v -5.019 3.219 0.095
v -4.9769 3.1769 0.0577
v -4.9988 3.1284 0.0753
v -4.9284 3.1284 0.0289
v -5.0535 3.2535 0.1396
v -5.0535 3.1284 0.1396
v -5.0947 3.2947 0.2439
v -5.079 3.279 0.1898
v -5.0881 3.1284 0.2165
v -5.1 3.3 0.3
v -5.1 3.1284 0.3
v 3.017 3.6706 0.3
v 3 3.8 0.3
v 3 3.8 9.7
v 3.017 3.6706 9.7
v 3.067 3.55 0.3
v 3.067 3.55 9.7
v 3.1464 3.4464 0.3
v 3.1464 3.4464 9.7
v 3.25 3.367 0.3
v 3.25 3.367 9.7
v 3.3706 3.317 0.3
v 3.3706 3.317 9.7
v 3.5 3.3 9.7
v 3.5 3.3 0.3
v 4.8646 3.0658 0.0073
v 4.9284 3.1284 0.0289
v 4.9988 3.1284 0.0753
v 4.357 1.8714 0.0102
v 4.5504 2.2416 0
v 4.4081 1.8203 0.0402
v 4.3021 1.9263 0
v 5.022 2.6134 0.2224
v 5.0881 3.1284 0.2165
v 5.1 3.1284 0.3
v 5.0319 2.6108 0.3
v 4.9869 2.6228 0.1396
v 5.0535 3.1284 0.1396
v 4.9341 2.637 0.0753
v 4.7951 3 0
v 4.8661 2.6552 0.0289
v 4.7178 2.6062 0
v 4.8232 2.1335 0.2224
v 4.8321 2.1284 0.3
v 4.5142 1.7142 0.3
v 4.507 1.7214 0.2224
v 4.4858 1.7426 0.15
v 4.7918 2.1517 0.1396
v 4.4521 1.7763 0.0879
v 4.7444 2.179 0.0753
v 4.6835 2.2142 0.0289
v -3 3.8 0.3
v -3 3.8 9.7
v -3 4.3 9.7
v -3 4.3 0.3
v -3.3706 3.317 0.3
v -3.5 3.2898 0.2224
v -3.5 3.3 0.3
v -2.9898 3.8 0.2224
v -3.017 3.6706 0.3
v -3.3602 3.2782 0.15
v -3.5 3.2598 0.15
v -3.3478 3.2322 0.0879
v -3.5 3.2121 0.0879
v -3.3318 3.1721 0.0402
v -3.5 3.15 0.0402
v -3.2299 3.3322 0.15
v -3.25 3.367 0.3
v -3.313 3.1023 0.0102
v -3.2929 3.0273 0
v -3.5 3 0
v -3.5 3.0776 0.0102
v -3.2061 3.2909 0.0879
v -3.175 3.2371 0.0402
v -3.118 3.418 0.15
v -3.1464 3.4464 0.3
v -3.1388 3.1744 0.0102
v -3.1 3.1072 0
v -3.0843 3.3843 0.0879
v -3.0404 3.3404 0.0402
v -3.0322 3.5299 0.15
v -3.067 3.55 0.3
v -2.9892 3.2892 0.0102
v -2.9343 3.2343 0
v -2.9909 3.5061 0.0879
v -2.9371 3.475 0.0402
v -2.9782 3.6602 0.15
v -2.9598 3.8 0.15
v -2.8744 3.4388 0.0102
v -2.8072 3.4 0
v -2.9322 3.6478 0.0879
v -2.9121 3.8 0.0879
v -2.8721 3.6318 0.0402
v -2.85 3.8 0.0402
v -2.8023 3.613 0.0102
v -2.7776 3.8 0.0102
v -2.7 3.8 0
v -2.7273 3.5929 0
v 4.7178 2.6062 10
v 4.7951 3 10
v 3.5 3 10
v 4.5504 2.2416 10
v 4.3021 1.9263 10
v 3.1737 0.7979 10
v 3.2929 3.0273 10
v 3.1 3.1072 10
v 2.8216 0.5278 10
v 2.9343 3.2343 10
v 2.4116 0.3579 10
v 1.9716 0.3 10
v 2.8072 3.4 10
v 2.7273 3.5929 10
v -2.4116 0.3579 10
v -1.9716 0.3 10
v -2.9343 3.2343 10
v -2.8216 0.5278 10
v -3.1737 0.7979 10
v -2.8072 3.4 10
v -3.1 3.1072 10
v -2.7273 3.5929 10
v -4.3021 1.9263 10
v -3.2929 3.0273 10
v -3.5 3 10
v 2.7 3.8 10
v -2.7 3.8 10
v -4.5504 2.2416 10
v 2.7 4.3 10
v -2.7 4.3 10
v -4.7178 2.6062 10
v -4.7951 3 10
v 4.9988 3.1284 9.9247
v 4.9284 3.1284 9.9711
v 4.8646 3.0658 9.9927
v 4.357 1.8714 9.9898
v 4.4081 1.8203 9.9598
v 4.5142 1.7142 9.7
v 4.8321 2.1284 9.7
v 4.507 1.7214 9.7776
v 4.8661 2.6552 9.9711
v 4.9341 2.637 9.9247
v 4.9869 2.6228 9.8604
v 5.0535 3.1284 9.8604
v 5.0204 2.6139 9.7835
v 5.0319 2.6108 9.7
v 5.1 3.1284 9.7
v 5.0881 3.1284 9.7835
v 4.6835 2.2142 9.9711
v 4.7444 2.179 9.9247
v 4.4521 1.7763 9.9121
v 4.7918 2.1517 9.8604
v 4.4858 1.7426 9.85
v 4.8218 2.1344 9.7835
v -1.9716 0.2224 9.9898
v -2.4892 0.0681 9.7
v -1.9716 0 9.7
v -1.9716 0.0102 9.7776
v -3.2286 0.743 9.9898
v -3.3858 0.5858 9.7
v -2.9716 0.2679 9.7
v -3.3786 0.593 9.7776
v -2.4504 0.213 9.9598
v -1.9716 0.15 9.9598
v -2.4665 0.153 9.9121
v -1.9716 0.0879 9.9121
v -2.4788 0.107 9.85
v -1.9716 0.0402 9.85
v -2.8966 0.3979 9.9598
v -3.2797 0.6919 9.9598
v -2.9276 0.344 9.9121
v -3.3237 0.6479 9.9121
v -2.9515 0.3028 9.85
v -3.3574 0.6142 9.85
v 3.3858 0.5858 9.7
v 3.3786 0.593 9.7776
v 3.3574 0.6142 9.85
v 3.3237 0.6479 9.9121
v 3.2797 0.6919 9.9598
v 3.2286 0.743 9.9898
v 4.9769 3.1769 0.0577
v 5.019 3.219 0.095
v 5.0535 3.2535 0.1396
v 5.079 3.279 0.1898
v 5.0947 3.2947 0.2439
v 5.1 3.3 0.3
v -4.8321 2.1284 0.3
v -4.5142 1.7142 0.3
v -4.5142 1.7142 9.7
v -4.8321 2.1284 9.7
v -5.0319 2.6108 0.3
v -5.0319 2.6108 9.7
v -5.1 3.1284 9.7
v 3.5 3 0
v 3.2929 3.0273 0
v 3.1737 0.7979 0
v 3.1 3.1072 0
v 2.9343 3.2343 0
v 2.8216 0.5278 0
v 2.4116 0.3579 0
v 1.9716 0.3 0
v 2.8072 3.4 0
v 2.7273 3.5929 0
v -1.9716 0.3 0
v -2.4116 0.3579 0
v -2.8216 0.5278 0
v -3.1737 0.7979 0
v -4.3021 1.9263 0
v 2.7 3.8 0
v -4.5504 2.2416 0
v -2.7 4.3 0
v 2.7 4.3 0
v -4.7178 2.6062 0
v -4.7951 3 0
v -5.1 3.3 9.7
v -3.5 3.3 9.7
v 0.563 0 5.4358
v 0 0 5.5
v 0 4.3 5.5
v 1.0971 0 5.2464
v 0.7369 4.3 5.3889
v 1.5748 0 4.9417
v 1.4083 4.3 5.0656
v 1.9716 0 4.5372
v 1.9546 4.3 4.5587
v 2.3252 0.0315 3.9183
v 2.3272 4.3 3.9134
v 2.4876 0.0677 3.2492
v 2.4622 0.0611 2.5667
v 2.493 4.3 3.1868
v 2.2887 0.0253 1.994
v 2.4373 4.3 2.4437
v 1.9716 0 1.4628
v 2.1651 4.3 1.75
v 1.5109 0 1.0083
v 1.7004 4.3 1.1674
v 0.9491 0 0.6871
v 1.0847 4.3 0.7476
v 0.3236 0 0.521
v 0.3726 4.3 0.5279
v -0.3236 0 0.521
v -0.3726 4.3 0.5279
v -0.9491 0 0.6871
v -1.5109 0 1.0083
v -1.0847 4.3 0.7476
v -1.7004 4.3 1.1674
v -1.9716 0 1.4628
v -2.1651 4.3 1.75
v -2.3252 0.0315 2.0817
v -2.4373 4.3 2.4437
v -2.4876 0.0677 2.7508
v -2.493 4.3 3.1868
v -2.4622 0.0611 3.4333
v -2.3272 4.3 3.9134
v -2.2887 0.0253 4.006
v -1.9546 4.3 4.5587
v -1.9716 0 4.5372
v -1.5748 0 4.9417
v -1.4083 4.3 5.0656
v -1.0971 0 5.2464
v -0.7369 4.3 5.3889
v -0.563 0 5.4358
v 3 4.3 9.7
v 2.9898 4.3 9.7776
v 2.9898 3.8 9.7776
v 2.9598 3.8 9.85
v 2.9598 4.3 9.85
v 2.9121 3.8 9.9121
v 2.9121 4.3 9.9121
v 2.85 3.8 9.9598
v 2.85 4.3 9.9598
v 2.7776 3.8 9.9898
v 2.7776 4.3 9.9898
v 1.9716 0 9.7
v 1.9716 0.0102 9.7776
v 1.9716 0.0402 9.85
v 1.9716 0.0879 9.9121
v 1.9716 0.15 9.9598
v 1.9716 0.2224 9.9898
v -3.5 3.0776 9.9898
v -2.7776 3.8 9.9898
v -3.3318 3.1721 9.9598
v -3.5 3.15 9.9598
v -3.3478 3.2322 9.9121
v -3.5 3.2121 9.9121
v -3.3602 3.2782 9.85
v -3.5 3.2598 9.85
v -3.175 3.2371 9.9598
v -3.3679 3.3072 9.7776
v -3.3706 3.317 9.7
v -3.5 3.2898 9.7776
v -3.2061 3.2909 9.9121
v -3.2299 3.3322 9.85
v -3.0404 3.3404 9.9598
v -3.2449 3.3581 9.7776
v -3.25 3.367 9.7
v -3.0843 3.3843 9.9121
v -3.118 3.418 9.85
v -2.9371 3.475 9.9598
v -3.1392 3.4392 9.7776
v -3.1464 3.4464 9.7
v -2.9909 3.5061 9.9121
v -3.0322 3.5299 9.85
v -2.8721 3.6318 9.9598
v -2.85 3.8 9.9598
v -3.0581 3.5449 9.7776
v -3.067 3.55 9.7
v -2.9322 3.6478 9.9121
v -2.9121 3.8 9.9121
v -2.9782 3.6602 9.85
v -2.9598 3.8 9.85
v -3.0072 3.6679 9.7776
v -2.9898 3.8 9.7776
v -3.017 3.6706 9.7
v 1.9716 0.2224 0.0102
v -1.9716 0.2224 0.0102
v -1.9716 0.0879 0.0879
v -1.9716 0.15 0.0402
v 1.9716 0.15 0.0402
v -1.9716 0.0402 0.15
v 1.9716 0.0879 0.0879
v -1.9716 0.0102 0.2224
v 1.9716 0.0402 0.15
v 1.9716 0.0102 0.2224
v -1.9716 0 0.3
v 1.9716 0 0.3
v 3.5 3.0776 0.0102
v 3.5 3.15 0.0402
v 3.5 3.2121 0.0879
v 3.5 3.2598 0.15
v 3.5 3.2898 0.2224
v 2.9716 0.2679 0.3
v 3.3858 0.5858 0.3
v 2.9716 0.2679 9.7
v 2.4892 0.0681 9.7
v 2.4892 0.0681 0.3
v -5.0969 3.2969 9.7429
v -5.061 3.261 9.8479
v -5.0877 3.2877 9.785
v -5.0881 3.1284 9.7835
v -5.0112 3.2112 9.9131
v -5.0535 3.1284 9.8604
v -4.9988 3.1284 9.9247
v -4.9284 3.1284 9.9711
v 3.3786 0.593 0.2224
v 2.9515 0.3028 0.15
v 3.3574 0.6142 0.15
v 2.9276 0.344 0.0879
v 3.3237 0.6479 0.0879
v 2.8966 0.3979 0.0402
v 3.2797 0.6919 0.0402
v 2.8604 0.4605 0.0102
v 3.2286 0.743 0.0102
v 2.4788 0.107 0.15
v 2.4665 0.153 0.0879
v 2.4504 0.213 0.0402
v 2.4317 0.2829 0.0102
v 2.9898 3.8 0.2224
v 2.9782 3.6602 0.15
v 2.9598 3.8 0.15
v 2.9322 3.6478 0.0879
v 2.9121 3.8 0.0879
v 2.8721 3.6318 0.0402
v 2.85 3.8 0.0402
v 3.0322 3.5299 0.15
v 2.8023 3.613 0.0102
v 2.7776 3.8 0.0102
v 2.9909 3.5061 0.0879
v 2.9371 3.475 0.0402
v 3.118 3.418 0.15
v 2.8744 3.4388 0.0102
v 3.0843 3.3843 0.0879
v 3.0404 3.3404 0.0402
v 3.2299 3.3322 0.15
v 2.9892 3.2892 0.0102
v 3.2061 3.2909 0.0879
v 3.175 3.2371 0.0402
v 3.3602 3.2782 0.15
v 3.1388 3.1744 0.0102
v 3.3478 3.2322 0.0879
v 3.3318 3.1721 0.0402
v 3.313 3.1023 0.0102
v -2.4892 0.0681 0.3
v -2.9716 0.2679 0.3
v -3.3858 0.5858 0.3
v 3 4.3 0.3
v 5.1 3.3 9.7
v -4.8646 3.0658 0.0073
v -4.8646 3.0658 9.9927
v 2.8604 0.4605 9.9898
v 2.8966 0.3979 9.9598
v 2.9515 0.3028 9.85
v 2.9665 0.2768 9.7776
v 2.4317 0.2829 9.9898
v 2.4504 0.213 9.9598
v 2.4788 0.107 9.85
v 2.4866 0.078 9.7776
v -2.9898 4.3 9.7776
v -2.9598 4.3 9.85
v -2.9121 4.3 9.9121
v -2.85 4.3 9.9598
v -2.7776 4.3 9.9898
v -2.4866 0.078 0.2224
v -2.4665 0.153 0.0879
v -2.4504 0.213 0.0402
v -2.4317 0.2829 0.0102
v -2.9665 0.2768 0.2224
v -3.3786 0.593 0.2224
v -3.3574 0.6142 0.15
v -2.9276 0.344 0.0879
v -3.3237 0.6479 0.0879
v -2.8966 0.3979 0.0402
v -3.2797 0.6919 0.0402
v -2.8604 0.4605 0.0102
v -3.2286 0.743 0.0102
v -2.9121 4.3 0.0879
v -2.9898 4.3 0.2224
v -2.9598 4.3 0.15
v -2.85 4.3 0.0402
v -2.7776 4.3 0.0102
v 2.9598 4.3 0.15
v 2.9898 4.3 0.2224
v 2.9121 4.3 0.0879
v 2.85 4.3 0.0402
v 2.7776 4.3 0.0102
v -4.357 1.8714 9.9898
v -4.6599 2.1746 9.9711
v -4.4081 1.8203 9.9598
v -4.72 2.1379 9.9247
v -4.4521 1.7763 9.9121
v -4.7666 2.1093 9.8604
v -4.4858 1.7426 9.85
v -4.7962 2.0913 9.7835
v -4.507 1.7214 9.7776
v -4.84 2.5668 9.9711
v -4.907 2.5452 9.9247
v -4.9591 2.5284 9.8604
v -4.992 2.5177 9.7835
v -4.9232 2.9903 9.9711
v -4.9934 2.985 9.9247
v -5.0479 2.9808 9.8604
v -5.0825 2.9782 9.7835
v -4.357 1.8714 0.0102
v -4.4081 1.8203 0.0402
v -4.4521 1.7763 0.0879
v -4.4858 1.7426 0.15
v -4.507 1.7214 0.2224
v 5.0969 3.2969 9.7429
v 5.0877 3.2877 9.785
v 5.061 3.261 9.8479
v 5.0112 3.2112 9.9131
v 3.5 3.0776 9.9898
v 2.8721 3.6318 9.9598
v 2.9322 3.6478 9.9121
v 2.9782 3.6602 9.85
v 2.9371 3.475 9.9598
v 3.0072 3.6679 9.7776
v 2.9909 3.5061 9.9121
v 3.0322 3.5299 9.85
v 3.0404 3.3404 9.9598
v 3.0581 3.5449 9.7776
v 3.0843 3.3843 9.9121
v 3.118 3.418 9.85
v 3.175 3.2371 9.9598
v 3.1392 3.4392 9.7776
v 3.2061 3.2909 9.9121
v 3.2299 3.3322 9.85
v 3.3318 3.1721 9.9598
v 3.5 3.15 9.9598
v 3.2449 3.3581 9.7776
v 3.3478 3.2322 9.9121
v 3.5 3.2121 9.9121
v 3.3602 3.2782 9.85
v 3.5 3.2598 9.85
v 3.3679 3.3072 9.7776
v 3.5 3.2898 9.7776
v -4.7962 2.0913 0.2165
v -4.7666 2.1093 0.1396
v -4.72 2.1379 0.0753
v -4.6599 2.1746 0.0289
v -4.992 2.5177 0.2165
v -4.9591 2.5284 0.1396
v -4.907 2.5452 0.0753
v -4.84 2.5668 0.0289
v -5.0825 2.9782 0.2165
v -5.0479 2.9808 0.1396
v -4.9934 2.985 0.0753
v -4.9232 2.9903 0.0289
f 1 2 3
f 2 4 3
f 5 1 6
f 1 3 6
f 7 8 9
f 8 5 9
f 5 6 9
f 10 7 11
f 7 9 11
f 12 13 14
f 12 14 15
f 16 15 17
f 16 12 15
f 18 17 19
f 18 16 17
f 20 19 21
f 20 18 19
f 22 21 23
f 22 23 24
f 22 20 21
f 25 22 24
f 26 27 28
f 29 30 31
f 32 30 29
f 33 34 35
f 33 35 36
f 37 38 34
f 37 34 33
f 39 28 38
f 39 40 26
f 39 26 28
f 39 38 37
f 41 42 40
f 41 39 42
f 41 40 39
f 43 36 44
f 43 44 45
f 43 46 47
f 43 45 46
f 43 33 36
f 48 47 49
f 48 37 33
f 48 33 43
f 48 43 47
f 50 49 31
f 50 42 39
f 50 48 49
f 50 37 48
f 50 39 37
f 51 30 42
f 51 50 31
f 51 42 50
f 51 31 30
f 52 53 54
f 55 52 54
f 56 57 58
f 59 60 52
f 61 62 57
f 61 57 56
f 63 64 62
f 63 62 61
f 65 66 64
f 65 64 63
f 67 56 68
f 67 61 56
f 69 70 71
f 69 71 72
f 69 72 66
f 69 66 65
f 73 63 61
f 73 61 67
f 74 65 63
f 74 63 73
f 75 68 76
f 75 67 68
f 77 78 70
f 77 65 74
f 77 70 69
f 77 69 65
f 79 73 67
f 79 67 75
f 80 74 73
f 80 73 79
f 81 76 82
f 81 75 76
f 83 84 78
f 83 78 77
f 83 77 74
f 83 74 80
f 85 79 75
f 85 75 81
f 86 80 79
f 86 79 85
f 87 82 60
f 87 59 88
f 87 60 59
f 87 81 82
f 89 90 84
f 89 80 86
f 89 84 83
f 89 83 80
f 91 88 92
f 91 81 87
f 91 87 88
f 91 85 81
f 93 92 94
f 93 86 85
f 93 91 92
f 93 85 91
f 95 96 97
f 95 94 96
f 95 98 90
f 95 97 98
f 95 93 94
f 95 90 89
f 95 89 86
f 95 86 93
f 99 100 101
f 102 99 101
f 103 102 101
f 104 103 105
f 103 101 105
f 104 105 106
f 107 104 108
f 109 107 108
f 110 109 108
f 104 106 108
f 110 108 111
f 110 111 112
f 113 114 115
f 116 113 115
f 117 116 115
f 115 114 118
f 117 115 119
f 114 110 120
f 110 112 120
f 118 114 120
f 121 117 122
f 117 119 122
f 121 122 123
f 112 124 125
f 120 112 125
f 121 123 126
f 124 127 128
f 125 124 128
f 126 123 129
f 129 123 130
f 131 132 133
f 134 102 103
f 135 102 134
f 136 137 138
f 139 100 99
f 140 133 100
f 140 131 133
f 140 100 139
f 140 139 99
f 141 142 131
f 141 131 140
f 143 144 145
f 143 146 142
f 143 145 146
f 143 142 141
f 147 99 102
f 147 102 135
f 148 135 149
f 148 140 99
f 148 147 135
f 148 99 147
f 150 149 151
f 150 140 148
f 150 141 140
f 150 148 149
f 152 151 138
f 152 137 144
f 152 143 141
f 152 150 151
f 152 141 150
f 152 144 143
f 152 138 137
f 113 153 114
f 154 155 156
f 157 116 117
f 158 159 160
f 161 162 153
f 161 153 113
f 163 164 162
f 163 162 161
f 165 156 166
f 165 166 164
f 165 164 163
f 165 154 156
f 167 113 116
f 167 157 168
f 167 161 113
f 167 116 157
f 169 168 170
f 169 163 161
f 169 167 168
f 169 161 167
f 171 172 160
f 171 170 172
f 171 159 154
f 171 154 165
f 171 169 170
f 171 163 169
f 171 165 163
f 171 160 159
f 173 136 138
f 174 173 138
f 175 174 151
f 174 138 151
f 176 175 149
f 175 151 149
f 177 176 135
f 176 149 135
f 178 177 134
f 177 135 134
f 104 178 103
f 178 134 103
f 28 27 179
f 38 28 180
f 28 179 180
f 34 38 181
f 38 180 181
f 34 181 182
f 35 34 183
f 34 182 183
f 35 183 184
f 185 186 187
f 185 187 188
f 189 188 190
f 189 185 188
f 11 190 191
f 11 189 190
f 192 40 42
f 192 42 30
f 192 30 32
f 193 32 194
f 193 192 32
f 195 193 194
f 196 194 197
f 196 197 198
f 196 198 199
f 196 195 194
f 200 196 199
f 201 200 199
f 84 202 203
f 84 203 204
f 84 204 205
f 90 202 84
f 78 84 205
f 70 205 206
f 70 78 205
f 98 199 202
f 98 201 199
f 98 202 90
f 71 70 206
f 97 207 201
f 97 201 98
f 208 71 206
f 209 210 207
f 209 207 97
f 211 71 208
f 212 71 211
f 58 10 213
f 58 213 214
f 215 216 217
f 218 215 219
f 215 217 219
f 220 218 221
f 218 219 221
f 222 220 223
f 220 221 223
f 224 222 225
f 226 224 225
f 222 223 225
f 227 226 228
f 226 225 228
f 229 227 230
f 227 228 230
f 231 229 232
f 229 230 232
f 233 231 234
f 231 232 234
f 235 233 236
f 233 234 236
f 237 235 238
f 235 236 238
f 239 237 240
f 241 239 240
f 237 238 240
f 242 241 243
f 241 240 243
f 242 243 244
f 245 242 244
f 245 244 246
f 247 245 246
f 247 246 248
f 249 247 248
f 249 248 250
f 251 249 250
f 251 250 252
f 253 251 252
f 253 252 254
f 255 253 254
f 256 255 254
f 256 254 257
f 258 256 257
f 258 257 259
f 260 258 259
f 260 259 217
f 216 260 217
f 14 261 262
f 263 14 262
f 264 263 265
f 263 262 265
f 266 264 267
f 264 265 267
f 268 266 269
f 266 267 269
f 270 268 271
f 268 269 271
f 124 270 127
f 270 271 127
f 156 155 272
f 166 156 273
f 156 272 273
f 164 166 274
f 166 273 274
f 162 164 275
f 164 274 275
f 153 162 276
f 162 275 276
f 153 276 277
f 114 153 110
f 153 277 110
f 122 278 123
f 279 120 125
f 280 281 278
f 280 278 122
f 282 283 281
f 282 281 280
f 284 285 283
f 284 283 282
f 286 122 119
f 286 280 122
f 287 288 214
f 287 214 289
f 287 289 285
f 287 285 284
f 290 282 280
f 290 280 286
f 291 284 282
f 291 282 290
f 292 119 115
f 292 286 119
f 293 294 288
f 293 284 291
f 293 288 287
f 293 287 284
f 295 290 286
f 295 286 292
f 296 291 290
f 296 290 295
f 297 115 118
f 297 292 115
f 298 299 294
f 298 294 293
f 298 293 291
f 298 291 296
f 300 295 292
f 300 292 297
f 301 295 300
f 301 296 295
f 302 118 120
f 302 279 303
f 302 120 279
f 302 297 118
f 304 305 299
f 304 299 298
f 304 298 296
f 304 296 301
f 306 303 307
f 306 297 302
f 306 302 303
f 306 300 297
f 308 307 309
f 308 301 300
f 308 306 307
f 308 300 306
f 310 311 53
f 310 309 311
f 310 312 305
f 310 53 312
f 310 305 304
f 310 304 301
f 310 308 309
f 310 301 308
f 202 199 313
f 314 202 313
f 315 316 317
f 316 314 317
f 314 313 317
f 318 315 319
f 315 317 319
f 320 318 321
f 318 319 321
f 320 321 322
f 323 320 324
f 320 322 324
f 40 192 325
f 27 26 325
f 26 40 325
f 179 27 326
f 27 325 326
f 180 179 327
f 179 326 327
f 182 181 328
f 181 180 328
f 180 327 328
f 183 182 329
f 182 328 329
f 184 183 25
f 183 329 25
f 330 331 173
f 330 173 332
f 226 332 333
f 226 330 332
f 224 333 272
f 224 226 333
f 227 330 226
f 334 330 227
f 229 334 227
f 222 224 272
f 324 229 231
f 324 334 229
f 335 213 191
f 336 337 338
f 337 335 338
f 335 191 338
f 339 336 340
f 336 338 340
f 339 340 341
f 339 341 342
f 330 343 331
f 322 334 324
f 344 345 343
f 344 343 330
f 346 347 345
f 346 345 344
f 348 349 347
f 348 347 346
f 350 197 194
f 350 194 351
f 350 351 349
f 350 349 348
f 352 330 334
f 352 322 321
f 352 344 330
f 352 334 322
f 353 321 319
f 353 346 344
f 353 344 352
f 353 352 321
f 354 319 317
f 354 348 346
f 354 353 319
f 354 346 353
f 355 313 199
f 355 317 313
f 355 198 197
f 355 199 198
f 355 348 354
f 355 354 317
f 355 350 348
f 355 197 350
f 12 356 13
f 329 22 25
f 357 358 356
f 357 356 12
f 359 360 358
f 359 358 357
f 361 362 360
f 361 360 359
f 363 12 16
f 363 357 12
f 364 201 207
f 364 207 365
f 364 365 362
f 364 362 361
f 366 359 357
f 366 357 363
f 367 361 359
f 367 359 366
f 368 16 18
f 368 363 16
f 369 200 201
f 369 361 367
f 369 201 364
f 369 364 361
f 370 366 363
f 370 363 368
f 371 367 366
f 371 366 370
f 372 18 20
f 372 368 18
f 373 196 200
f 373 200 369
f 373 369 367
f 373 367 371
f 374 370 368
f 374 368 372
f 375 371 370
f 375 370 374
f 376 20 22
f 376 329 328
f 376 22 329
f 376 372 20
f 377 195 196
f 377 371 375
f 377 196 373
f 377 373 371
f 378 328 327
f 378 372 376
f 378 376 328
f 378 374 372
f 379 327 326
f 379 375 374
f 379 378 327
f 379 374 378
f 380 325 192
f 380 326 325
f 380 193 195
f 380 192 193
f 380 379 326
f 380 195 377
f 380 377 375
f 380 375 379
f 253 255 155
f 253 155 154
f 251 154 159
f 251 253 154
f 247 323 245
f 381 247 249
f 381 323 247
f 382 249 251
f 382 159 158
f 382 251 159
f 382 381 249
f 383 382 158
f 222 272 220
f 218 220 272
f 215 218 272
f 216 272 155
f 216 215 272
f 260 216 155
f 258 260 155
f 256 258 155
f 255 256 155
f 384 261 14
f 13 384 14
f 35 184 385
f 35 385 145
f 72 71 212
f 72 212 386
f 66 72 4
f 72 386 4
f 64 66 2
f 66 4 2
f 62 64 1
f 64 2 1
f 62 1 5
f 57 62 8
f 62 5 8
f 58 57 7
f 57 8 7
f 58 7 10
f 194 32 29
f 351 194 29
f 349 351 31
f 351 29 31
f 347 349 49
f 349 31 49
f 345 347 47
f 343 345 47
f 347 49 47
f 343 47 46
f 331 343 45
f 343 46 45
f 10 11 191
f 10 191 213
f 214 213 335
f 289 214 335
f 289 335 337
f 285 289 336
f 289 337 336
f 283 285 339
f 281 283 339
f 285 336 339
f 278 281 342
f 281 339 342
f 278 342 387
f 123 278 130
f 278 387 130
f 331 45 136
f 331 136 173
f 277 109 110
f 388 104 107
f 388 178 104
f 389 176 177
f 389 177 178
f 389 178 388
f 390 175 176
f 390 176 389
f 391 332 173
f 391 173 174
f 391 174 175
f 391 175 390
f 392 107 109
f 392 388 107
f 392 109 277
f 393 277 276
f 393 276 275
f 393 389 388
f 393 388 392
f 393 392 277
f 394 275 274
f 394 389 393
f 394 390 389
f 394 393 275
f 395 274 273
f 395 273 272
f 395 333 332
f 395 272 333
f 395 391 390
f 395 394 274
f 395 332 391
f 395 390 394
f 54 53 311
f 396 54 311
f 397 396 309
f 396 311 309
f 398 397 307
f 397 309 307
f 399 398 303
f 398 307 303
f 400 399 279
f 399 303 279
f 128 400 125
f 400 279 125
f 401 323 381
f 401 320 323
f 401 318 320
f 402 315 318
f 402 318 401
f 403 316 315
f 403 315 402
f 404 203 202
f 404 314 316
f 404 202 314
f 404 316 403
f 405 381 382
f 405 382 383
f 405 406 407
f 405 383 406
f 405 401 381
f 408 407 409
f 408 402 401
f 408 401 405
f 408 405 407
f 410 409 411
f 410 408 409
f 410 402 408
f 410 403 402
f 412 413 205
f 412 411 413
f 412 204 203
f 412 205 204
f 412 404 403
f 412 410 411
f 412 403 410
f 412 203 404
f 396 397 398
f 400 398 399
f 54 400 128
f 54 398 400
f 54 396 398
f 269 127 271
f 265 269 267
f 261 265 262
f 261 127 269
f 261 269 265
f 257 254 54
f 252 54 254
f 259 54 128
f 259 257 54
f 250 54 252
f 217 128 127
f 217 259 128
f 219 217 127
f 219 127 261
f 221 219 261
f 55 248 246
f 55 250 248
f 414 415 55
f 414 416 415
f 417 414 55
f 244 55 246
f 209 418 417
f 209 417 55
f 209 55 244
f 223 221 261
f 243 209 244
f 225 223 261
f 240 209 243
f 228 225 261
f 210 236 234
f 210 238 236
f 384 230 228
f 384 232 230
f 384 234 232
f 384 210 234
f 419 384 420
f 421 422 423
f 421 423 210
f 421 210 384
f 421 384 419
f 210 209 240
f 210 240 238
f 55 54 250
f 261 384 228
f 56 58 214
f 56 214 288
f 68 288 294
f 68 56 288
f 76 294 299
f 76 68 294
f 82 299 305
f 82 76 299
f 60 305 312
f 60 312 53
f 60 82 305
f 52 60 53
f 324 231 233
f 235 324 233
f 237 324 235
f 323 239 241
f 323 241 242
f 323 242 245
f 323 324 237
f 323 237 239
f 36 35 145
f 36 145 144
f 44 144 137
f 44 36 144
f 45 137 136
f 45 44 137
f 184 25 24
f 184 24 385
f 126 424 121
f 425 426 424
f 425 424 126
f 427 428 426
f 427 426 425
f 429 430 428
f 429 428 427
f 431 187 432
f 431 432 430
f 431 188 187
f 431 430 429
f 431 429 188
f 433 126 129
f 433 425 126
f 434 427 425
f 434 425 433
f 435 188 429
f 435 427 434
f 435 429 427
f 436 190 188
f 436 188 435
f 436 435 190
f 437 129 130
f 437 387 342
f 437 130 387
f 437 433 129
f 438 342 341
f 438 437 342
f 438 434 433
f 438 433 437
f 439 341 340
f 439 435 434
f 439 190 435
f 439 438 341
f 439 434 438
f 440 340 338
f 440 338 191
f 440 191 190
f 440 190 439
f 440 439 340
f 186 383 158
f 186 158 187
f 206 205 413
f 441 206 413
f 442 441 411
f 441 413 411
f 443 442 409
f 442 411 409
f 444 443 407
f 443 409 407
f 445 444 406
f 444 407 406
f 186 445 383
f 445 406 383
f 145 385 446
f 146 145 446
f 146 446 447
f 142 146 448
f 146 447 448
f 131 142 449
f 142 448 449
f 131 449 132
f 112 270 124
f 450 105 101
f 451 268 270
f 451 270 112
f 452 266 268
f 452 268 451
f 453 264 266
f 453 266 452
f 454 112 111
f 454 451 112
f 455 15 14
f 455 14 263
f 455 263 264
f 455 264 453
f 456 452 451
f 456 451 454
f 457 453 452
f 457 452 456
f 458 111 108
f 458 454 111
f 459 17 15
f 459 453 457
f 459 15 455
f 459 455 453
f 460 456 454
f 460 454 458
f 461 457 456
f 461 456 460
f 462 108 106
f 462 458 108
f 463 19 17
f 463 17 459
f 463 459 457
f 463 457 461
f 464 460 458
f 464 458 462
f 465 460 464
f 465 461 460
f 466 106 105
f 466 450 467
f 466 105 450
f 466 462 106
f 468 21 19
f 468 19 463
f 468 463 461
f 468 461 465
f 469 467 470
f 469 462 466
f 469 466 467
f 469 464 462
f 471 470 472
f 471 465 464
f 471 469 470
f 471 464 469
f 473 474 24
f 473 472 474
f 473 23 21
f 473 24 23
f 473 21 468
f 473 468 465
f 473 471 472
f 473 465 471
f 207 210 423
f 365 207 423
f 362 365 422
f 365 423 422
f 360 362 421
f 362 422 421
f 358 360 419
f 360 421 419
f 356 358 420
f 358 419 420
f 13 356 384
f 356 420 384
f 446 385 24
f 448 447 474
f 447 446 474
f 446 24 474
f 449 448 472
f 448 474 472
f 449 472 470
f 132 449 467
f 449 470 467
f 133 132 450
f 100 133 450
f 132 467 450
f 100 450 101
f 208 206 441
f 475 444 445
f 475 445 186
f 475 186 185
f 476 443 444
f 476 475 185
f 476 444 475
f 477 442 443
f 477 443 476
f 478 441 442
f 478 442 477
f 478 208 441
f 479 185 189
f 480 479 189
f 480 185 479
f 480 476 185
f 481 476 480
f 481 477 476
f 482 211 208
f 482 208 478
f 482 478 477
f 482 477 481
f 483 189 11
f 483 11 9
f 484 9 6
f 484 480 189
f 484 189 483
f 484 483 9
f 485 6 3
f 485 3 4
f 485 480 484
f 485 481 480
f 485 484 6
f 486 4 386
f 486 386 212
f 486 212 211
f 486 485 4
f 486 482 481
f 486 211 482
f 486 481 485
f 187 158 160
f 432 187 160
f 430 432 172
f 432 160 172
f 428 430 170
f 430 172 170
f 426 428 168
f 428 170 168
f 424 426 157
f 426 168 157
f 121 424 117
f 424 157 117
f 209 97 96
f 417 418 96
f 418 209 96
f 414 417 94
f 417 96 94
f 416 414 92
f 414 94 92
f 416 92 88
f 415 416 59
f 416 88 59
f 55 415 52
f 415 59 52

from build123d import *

# Parameters (mm, degrees)
EXTRUDE_1_DEPTH     = 10
FILLET_3_R          = 0.3
SKETCH_2_R          = 2.5
CUT_EXTRUDE_1_DEPTH = 6


with BuildPart() as part:
    # 草图1 → 凸台-拉伸1 (new body)
    with BuildSketch(Plane.XY):
        with BuildLine():
            Line((-3, 4.3), (3, 4.3))
            Line((3, 4.3), (3, 3.8))
            ThreePointArc((3, 3.8), (3.146446609, 3.446446609), (3.5, 3.3))
            Line((3.5, 3.3), (5.1, 3.3))
            Line((5.1, 3.3), (5.1, 3.128427125))
            ThreePointArc((5.1, 3.128427125), (4.947759065, 2.36306026), (4.514213562, 1.714213562))
            Line((4.514213562, 1.714213562), (3.385786438, 0.585786438))
            ThreePointArc((3.385786438, 0.585786438), (2.73693974, 0.152240935), (1.971572875, 0))
            Line((1.971572875, 0), (-1.971572875, 0))
            ThreePointArc((-1.971572875, 0), (-2.73693974, 0.152240935), (-3.385786438, 0.585786438))
            Line((-3.385786438, 0.585786438), (-4.514213562, 1.714213562))
            ThreePointArc((-4.514213562, 1.714213562), (-4.947759065, 2.36306026), (-5.1, 3.128427125))
            Line((-5.1, 3.128427125), (-5.1, 3.3))
            Line((-5.1, 3.3), (-3.5, 3.3))
            ThreePointArc((-3.5, 3.3), (-3.146446609, 3.446446609), (-3, 3.8))
            Line((-3, 3.8), (-3, 4.3))
        make_face()
    extrude(amount=EXTRUDE_1_DEPTH)

    # 圆角3
    # the kernel refuses this fillet: 0.3 mm, written as the material it takes off along each edge
    with BuildSketch(Plane(origin=(-3, 3.8, 10), x_dir=(0, 0, -1), z_dir=(0, 1, 0)), Plane(origin=(3, 5.05, 10), x_dir=(0, 0, -1), z_dir=(0, -1, 0))) as fillet_3_piece_1:
        with BuildLine():
            CenterArc((FILLET_3_R, -FILLET_3_R), FILLET_3_R, 90, 90)
            Line((0, -FILLET_3_R), (0, 0))
            Line((0, 0), (FILLET_3_R, 0))
        make_face()
    extrude(amount=1.25, mode=Mode.SUBTRACT)
    with BuildSketch(Plane(origin=(3, 5.05, 0), x_dir=(0, 0, 1), z_dir=(0, -1, 0)), Plane(origin=(-3, 3.8, 0), x_dir=(0, 0, 1), z_dir=(0, 1, 0))) as fillet_3_piece_2:
        with BuildLine():
            CenterArc((FILLET_3_R, FILLET_3_R), FILLET_3_R, 180, 90)
            Line((0, FILLET_3_R), (0, 0))
            Line((0, 0), (FILLET_3_R, 0))
        make_face()
    extrude(amount=1.25, mode=Mode.SUBTRACT)
    with BuildSketch(Plane(origin=(4.514213562, 1.714213562, 10), x_dir=(0, 0, -1), z_dir=(-0.7071067811865436, -0.7071067811865515, 0)), Plane(origin=(-3.385786438, 0.585786438, 10), x_dir=(0, 0, -1), z_dir=(-0.7071067811865436, 0.7071067811865515, 0))) as fillet_3_piece_3:
        with BuildLine():
            CenterArc((FILLET_3_R, -FILLET_3_R), FILLET_3_R, 90, 90)
            Line((0, -FILLET_3_R), (0, 0))
            Line((0, 0), (FILLET_3_R, 0))
        make_face()
    extrude(amount=1.595836944, mode=Mode.SUBTRACT)
    with BuildSketch(Plane(origin=(1.971572875, 2, 10), x_dir=(0.7071067811865542, -0.7071067811865409, 0), z_dir=(0.7071067811865409, 0.7071067811865542, 0))) as fillet_3_piece_4:
        with BuildLine():
            CenterArc((2 - FILLET_3_R, FILLET_3_R), FILLET_3_R, 270, 90)
            Line((2 - FILLET_3_R, 0), (2, 0))
            Line((2, 0), (2, FILLET_3_R))
        make_face()
    revolve(axis=Axis((1.971572875, 2, 10), (0, 0, -1)), revolution_arc=45, mode=Mode.SUBTRACT)
    with BuildSketch(Plane(origin=(1.971572875, 0, 10), x_dir=(0, 0, -1), z_dir=(-1, 0, 0))) as fillet_3_piece_5:
        with BuildLine():
            CenterArc((FILLET_3_R, -FILLET_3_R), FILLET_3_R, 90, 90)
            Line((0, -FILLET_3_R), (0, 0))
            Line((0, 0), (FILLET_3_R, 0))
        make_face()
    extrude(amount=3.943145751, mode=Mode.SUBTRACT)
    with BuildSketch(Plane(origin=(-1.971572875, 2, 10), x_dir=(0, -1, 0), z_dir=(1, 0, 0))) as fillet_3_piece_6:
        with BuildLine():
            CenterArc((2 - FILLET_3_R, FILLET_3_R), FILLET_3_R, 270, 90)
            Line((2 - FILLET_3_R, 0), (2, 0))
            Line((2, 0), (2, FILLET_3_R))
        make_face()
    revolve(axis=Axis((-1.971572875, 2, 10), (0, 0, -1)), revolution_arc=45, mode=Mode.SUBTRACT)
    with BuildSketch(Plane(origin=(-3.1, 3.128427125, 10), x_dir=(-0.7071067811865485, -0.7071067811865466, 0), z_dir=(0.7071067811865466, -0.7071067811865485, 0))) as fillet_3_piece_7:
        with BuildLine():
            CenterArc((2 - FILLET_3_R, FILLET_3_R), FILLET_3_R, 270, 90)
            Line((2 - FILLET_3_R, 0), (2, 0))
            Line((2, 0), (2, FILLET_3_R))
        make_face()
    revolve(axis=Axis((-3.1, 3.128427125, 10), (0, 0, -1)), revolution_arc=45, mode=Mode.SUBTRACT)
    with BuildSketch(Plane(origin=(-5.85, 3.3, 10), x_dir=(0, 0, -1), z_dir=(1, 0, 0)), Plane(origin=(3.5, 3.3, 10), x_dir=(0, 0, -1), z_dir=(1, 0, 0))) as fillet_3_piece_8:
        with BuildLine():
            CenterArc((FILLET_3_R, -FILLET_3_R), FILLET_3_R, 90, 90)
            Line((0, -FILLET_3_R), (0, 0))
            Line((0, 0), (FILLET_3_R, 0))
        make_face()
    extrude(amount=2.35, mode=Mode.SUBTRACT)
    with BuildSketch(Plane(origin=(-3.5, 3.8, 10), x_dir=(0, -1, 0), z_dir=(-1, 0, 0))) as fillet_3_piece_9:
        with BuildLine():
            CenterArc((0.5 + FILLET_3_R, -FILLET_3_R), FILLET_3_R, 90, 90)
            Line((0.5 + FILLET_3_R, 0), (0.5, 0))
            Line((0.5, 0), (0.5, -FILLET_3_R))
        make_face()
    revolve(axis=Axis((-3.5, 3.8, 10), (0, 0, 1)), revolution_arc=90, mode=Mode.SUBTRACT)
    with BuildSketch(Plane(origin=(3.5, 3.3, 0), x_dir=(0, 0, 1), z_dir=(1, 0, 0)), Plane(origin=(-5.85, 3.3, 0), x_dir=(0, 0, 1), z_dir=(1, 0, 0))) as fillet_3_piece_10:
        with BuildLine():
            CenterArc((FILLET_3_R, FILLET_3_R), FILLET_3_R, 180, 90)
            Line((0, FILLET_3_R), (0, 0))
            Line((0, 0), (FILLET_3_R, 0))
        make_face()
    extrude(amount=2.35, mode=Mode.SUBTRACT)
    with BuildSketch(Plane(origin=(3.5, 3.8, 0), x_dir=(-1, 0, 0), z_dir=(0, 1, 0))) as fillet_3_piece_11:
        with BuildLine():
            CenterArc((0.5 + FILLET_3_R, FILLET_3_R), FILLET_3_R, 180, 90)
            Line((0.5 + FILLET_3_R, 0), (0.5, 0))
            Line((0.5, 0), (0.5, FILLET_3_R))
        make_face()
    revolve(axis=Axis((3.5, 3.8, 0), (0, 0, 1)), revolution_arc=90, mode=Mode.SUBTRACT)
    with BuildSketch(Plane(origin=(-3.385786438, 0.585786438, 0), x_dir=(0, 0, 1), z_dir=(-0.7071067811865436, 0.7071067811865515, 0)), Plane(origin=(4.514213562, 1.714213562, 0), x_dir=(0, 0, 1), z_dir=(-0.7071067811865436, -0.7071067811865515, 0))) as fillet_3_piece_12:
        with BuildLine():
            CenterArc((FILLET_3_R, FILLET_3_R), FILLET_3_R, 180, 90)
            Line((0, FILLET_3_R), (0, 0))
            Line((0, 0), (FILLET_3_R, 0))
        make_face()
    extrude(amount=1.595836944, mode=Mode.SUBTRACT)
    with BuildSketch(Plane(origin=(-1.971572875, 2, 0), x_dir=(0, -1, 0), z_dir=(1, 0, 0))) as fillet_3_piece_13:
        with BuildLine():
            CenterArc((2 - FILLET_3_R, -FILLET_3_R), FILLET_3_R, 0, 90)
            Line((2 - FILLET_3_R, 0), (2, 0))
            Line((2, 0), (2, -FILLET_3_R))
        make_face()
    revolve(axis=Axis((-1.971572875, 2, 0), (0, 0, -1)), revolution_arc=45, mode=Mode.SUBTRACT)
    with BuildSketch(Plane(origin=(1.971572875, 0, 0), x_dir=(0, 0, 1), z_dir=(-1, 0, 0))) as fillet_3_piece_14:
        with BuildLine():
            CenterArc((FILLET_3_R, FILLET_3_R), FILLET_3_R, 180, 90)
            Line((0, FILLET_3_R), (0, 0))
            Line((0, 0), (FILLET_3_R, 0))
        make_face()
    extrude(amount=3.943145751, mode=Mode.SUBTRACT)
    with BuildSketch(Plane(origin=(1.971572875, 2, 0), x_dir=(0.7071067811865542, -0.7071067811865409, 0), z_dir=(0.7071067811865409, 0.7071067811865542, 0))) as fillet_3_piece_15:
        with BuildLine():
            CenterArc((2 - FILLET_3_R, -FILLET_3_R), FILLET_3_R, 0, 90)
            Line((2 - FILLET_3_R, 0), (2, 0))
            Line((2, 0), (2, -FILLET_3_R))
        make_face()
    revolve(axis=Axis((1.971572875, 2, 0), (0, 0, -1)), revolution_arc=45, mode=Mode.SUBTRACT)
    with BuildSketch(Plane(origin=(3.1, 3.128427125, 0), x_dir=(1, 0, 0), z_dir=(0, 1, 0))) as fillet_3_piece_16:
        with BuildLine():
            CenterArc((2 - FILLET_3_R, -FILLET_3_R), FILLET_3_R, 0, 90)
            Line((2 - FILLET_3_R, 0), (2, 0))
            Line((2, 0), (2, -FILLET_3_R))
        make_face()
    revolve(axis=Axis((3.1, 3.128427125, 0), (0, 0, -1)), revolution_arc=45, mode=Mode.SUBTRACT)
    with BuildSketch(Plane(origin=(3.1, 3.128427125, 10), x_dir=(1, 0, 0), z_dir=(0, 1, 0))) as fillet_3_piece_17:
        with BuildLine():
            CenterArc((2 - FILLET_3_R, FILLET_3_R), FILLET_3_R, 270, 90)
            Line((2 - FILLET_3_R, 0), (2, 0))
            Line((2, 0), (2, FILLET_3_R))
        make_face()
    revolve(axis=Axis((3.1, 3.128427125, 10), (0, 0, -1)), revolution_arc=45, mode=Mode.SUBTRACT)
    with BuildSketch(Plane(origin=(-3.1, 3.128427125, 0), x_dir=(-0.7071067811865485, -0.7071067811865466, 0), z_dir=(0.7071067811865466, -0.7071067811865485, 0))) as fillet_3_piece_18:
        with BuildLine():
            CenterArc((2 - FILLET_3_R, -FILLET_3_R), FILLET_3_R, 0, 90)
            Line((2 - FILLET_3_R, 0), (2, 0))
            Line((2, 0), (2, -FILLET_3_R))
        make_face()
    revolve(axis=Axis((-3.1, 3.128427125, 0), (0, 0, -1)), revolution_arc=45, mode=Mode.SUBTRACT)
    with BuildSketch(Plane(origin=(3.5, 3.8, 10), x_dir=(-1, 0, 0), z_dir=(0, 1, 0))) as fillet_3_piece_19:
        with BuildLine():
            CenterArc((0.5 + FILLET_3_R, -FILLET_3_R), FILLET_3_R, 90, 90)
            Line((0.5 + FILLET_3_R, 0), (0.5, 0))
            Line((0.5, 0), (0.5, -FILLET_3_R))
        make_face()
    revolve(axis=Axis((3.5, 3.8, 10), (0, 0, 1)), revolution_arc=90, mode=Mode.SUBTRACT)
    with BuildSketch(Plane(origin=(-3.5, 3.8, 0), x_dir=(0, -1, 0), z_dir=(-1, 0, 0))) as fillet_3_piece_20:
        with BuildLine():
            CenterArc((0.5 + FILLET_3_R, FILLET_3_R), FILLET_3_R, 180, 90)
            Line((0.5 + FILLET_3_R, 0), (0.5, 0))
            Line((0.5, 0), (0.5, FILLET_3_R))
        make_face()
    revolve(axis=Axis((-3.5, 3.8, 0), (0, 0, 1)), revolution_arc=90, mode=Mode.SUBTRACT)
    with BuildSketch(Plane(origin=(-5.1, 3.128427125, 0), x_dir=(0, 0, 1), z_dir=(0, 1, 0)), Plane(origin=(5.1, 4.05, 0), x_dir=(0, 0, 1), z_dir=(0, -1, 0))) as fillet_3_piece_21:
        with BuildLine():
            CenterArc((FILLET_3_R, FILLET_3_R), FILLET_3_R, 180, 90)
            Line((0, FILLET_3_R), (0, 0))
            Line((0, 0), (FILLET_3_R, 0))
        make_face()
    extrude(amount=0.921572875, mode=Mode.SUBTRACT)
    with BuildSketch(Plane(origin=(5.1, 4.05, 10), x_dir=(0, 0, -1), z_dir=(0, -1, 0)), Plane(origin=(-5.1, 3.128427125, 10), x_dir=(0, 0, -1), z_dir=(0, 1, 0))) as fillet_3_piece_22:
        with BuildLine():
            CenterArc((FILLET_3_R, -FILLET_3_R), FILLET_3_R, 90, 90)
            Line((0, -FILLET_3_R), (0, 0))
            Line((0, 0), (FILLET_3_R, 0))
        make_face()
    extrude(amount=0.921572875, mode=Mode.SUBTRACT)

    # 草图2 → 切除-拉伸1 (cut)
    with BuildSketch(Plane(origin=(0, 4.3, 0), x_dir=(1, 0, 0), z_dir=(0, 1, 0))):
        with Locations(Location((0, -3, 0), (0, 0, 270))):
            Circle(SKETCH_2_R)
    extrude(amount=-CUT_EXTRUDE_1_DEPTH, mode=Mode.SUBTRACT)


solid = part.part
